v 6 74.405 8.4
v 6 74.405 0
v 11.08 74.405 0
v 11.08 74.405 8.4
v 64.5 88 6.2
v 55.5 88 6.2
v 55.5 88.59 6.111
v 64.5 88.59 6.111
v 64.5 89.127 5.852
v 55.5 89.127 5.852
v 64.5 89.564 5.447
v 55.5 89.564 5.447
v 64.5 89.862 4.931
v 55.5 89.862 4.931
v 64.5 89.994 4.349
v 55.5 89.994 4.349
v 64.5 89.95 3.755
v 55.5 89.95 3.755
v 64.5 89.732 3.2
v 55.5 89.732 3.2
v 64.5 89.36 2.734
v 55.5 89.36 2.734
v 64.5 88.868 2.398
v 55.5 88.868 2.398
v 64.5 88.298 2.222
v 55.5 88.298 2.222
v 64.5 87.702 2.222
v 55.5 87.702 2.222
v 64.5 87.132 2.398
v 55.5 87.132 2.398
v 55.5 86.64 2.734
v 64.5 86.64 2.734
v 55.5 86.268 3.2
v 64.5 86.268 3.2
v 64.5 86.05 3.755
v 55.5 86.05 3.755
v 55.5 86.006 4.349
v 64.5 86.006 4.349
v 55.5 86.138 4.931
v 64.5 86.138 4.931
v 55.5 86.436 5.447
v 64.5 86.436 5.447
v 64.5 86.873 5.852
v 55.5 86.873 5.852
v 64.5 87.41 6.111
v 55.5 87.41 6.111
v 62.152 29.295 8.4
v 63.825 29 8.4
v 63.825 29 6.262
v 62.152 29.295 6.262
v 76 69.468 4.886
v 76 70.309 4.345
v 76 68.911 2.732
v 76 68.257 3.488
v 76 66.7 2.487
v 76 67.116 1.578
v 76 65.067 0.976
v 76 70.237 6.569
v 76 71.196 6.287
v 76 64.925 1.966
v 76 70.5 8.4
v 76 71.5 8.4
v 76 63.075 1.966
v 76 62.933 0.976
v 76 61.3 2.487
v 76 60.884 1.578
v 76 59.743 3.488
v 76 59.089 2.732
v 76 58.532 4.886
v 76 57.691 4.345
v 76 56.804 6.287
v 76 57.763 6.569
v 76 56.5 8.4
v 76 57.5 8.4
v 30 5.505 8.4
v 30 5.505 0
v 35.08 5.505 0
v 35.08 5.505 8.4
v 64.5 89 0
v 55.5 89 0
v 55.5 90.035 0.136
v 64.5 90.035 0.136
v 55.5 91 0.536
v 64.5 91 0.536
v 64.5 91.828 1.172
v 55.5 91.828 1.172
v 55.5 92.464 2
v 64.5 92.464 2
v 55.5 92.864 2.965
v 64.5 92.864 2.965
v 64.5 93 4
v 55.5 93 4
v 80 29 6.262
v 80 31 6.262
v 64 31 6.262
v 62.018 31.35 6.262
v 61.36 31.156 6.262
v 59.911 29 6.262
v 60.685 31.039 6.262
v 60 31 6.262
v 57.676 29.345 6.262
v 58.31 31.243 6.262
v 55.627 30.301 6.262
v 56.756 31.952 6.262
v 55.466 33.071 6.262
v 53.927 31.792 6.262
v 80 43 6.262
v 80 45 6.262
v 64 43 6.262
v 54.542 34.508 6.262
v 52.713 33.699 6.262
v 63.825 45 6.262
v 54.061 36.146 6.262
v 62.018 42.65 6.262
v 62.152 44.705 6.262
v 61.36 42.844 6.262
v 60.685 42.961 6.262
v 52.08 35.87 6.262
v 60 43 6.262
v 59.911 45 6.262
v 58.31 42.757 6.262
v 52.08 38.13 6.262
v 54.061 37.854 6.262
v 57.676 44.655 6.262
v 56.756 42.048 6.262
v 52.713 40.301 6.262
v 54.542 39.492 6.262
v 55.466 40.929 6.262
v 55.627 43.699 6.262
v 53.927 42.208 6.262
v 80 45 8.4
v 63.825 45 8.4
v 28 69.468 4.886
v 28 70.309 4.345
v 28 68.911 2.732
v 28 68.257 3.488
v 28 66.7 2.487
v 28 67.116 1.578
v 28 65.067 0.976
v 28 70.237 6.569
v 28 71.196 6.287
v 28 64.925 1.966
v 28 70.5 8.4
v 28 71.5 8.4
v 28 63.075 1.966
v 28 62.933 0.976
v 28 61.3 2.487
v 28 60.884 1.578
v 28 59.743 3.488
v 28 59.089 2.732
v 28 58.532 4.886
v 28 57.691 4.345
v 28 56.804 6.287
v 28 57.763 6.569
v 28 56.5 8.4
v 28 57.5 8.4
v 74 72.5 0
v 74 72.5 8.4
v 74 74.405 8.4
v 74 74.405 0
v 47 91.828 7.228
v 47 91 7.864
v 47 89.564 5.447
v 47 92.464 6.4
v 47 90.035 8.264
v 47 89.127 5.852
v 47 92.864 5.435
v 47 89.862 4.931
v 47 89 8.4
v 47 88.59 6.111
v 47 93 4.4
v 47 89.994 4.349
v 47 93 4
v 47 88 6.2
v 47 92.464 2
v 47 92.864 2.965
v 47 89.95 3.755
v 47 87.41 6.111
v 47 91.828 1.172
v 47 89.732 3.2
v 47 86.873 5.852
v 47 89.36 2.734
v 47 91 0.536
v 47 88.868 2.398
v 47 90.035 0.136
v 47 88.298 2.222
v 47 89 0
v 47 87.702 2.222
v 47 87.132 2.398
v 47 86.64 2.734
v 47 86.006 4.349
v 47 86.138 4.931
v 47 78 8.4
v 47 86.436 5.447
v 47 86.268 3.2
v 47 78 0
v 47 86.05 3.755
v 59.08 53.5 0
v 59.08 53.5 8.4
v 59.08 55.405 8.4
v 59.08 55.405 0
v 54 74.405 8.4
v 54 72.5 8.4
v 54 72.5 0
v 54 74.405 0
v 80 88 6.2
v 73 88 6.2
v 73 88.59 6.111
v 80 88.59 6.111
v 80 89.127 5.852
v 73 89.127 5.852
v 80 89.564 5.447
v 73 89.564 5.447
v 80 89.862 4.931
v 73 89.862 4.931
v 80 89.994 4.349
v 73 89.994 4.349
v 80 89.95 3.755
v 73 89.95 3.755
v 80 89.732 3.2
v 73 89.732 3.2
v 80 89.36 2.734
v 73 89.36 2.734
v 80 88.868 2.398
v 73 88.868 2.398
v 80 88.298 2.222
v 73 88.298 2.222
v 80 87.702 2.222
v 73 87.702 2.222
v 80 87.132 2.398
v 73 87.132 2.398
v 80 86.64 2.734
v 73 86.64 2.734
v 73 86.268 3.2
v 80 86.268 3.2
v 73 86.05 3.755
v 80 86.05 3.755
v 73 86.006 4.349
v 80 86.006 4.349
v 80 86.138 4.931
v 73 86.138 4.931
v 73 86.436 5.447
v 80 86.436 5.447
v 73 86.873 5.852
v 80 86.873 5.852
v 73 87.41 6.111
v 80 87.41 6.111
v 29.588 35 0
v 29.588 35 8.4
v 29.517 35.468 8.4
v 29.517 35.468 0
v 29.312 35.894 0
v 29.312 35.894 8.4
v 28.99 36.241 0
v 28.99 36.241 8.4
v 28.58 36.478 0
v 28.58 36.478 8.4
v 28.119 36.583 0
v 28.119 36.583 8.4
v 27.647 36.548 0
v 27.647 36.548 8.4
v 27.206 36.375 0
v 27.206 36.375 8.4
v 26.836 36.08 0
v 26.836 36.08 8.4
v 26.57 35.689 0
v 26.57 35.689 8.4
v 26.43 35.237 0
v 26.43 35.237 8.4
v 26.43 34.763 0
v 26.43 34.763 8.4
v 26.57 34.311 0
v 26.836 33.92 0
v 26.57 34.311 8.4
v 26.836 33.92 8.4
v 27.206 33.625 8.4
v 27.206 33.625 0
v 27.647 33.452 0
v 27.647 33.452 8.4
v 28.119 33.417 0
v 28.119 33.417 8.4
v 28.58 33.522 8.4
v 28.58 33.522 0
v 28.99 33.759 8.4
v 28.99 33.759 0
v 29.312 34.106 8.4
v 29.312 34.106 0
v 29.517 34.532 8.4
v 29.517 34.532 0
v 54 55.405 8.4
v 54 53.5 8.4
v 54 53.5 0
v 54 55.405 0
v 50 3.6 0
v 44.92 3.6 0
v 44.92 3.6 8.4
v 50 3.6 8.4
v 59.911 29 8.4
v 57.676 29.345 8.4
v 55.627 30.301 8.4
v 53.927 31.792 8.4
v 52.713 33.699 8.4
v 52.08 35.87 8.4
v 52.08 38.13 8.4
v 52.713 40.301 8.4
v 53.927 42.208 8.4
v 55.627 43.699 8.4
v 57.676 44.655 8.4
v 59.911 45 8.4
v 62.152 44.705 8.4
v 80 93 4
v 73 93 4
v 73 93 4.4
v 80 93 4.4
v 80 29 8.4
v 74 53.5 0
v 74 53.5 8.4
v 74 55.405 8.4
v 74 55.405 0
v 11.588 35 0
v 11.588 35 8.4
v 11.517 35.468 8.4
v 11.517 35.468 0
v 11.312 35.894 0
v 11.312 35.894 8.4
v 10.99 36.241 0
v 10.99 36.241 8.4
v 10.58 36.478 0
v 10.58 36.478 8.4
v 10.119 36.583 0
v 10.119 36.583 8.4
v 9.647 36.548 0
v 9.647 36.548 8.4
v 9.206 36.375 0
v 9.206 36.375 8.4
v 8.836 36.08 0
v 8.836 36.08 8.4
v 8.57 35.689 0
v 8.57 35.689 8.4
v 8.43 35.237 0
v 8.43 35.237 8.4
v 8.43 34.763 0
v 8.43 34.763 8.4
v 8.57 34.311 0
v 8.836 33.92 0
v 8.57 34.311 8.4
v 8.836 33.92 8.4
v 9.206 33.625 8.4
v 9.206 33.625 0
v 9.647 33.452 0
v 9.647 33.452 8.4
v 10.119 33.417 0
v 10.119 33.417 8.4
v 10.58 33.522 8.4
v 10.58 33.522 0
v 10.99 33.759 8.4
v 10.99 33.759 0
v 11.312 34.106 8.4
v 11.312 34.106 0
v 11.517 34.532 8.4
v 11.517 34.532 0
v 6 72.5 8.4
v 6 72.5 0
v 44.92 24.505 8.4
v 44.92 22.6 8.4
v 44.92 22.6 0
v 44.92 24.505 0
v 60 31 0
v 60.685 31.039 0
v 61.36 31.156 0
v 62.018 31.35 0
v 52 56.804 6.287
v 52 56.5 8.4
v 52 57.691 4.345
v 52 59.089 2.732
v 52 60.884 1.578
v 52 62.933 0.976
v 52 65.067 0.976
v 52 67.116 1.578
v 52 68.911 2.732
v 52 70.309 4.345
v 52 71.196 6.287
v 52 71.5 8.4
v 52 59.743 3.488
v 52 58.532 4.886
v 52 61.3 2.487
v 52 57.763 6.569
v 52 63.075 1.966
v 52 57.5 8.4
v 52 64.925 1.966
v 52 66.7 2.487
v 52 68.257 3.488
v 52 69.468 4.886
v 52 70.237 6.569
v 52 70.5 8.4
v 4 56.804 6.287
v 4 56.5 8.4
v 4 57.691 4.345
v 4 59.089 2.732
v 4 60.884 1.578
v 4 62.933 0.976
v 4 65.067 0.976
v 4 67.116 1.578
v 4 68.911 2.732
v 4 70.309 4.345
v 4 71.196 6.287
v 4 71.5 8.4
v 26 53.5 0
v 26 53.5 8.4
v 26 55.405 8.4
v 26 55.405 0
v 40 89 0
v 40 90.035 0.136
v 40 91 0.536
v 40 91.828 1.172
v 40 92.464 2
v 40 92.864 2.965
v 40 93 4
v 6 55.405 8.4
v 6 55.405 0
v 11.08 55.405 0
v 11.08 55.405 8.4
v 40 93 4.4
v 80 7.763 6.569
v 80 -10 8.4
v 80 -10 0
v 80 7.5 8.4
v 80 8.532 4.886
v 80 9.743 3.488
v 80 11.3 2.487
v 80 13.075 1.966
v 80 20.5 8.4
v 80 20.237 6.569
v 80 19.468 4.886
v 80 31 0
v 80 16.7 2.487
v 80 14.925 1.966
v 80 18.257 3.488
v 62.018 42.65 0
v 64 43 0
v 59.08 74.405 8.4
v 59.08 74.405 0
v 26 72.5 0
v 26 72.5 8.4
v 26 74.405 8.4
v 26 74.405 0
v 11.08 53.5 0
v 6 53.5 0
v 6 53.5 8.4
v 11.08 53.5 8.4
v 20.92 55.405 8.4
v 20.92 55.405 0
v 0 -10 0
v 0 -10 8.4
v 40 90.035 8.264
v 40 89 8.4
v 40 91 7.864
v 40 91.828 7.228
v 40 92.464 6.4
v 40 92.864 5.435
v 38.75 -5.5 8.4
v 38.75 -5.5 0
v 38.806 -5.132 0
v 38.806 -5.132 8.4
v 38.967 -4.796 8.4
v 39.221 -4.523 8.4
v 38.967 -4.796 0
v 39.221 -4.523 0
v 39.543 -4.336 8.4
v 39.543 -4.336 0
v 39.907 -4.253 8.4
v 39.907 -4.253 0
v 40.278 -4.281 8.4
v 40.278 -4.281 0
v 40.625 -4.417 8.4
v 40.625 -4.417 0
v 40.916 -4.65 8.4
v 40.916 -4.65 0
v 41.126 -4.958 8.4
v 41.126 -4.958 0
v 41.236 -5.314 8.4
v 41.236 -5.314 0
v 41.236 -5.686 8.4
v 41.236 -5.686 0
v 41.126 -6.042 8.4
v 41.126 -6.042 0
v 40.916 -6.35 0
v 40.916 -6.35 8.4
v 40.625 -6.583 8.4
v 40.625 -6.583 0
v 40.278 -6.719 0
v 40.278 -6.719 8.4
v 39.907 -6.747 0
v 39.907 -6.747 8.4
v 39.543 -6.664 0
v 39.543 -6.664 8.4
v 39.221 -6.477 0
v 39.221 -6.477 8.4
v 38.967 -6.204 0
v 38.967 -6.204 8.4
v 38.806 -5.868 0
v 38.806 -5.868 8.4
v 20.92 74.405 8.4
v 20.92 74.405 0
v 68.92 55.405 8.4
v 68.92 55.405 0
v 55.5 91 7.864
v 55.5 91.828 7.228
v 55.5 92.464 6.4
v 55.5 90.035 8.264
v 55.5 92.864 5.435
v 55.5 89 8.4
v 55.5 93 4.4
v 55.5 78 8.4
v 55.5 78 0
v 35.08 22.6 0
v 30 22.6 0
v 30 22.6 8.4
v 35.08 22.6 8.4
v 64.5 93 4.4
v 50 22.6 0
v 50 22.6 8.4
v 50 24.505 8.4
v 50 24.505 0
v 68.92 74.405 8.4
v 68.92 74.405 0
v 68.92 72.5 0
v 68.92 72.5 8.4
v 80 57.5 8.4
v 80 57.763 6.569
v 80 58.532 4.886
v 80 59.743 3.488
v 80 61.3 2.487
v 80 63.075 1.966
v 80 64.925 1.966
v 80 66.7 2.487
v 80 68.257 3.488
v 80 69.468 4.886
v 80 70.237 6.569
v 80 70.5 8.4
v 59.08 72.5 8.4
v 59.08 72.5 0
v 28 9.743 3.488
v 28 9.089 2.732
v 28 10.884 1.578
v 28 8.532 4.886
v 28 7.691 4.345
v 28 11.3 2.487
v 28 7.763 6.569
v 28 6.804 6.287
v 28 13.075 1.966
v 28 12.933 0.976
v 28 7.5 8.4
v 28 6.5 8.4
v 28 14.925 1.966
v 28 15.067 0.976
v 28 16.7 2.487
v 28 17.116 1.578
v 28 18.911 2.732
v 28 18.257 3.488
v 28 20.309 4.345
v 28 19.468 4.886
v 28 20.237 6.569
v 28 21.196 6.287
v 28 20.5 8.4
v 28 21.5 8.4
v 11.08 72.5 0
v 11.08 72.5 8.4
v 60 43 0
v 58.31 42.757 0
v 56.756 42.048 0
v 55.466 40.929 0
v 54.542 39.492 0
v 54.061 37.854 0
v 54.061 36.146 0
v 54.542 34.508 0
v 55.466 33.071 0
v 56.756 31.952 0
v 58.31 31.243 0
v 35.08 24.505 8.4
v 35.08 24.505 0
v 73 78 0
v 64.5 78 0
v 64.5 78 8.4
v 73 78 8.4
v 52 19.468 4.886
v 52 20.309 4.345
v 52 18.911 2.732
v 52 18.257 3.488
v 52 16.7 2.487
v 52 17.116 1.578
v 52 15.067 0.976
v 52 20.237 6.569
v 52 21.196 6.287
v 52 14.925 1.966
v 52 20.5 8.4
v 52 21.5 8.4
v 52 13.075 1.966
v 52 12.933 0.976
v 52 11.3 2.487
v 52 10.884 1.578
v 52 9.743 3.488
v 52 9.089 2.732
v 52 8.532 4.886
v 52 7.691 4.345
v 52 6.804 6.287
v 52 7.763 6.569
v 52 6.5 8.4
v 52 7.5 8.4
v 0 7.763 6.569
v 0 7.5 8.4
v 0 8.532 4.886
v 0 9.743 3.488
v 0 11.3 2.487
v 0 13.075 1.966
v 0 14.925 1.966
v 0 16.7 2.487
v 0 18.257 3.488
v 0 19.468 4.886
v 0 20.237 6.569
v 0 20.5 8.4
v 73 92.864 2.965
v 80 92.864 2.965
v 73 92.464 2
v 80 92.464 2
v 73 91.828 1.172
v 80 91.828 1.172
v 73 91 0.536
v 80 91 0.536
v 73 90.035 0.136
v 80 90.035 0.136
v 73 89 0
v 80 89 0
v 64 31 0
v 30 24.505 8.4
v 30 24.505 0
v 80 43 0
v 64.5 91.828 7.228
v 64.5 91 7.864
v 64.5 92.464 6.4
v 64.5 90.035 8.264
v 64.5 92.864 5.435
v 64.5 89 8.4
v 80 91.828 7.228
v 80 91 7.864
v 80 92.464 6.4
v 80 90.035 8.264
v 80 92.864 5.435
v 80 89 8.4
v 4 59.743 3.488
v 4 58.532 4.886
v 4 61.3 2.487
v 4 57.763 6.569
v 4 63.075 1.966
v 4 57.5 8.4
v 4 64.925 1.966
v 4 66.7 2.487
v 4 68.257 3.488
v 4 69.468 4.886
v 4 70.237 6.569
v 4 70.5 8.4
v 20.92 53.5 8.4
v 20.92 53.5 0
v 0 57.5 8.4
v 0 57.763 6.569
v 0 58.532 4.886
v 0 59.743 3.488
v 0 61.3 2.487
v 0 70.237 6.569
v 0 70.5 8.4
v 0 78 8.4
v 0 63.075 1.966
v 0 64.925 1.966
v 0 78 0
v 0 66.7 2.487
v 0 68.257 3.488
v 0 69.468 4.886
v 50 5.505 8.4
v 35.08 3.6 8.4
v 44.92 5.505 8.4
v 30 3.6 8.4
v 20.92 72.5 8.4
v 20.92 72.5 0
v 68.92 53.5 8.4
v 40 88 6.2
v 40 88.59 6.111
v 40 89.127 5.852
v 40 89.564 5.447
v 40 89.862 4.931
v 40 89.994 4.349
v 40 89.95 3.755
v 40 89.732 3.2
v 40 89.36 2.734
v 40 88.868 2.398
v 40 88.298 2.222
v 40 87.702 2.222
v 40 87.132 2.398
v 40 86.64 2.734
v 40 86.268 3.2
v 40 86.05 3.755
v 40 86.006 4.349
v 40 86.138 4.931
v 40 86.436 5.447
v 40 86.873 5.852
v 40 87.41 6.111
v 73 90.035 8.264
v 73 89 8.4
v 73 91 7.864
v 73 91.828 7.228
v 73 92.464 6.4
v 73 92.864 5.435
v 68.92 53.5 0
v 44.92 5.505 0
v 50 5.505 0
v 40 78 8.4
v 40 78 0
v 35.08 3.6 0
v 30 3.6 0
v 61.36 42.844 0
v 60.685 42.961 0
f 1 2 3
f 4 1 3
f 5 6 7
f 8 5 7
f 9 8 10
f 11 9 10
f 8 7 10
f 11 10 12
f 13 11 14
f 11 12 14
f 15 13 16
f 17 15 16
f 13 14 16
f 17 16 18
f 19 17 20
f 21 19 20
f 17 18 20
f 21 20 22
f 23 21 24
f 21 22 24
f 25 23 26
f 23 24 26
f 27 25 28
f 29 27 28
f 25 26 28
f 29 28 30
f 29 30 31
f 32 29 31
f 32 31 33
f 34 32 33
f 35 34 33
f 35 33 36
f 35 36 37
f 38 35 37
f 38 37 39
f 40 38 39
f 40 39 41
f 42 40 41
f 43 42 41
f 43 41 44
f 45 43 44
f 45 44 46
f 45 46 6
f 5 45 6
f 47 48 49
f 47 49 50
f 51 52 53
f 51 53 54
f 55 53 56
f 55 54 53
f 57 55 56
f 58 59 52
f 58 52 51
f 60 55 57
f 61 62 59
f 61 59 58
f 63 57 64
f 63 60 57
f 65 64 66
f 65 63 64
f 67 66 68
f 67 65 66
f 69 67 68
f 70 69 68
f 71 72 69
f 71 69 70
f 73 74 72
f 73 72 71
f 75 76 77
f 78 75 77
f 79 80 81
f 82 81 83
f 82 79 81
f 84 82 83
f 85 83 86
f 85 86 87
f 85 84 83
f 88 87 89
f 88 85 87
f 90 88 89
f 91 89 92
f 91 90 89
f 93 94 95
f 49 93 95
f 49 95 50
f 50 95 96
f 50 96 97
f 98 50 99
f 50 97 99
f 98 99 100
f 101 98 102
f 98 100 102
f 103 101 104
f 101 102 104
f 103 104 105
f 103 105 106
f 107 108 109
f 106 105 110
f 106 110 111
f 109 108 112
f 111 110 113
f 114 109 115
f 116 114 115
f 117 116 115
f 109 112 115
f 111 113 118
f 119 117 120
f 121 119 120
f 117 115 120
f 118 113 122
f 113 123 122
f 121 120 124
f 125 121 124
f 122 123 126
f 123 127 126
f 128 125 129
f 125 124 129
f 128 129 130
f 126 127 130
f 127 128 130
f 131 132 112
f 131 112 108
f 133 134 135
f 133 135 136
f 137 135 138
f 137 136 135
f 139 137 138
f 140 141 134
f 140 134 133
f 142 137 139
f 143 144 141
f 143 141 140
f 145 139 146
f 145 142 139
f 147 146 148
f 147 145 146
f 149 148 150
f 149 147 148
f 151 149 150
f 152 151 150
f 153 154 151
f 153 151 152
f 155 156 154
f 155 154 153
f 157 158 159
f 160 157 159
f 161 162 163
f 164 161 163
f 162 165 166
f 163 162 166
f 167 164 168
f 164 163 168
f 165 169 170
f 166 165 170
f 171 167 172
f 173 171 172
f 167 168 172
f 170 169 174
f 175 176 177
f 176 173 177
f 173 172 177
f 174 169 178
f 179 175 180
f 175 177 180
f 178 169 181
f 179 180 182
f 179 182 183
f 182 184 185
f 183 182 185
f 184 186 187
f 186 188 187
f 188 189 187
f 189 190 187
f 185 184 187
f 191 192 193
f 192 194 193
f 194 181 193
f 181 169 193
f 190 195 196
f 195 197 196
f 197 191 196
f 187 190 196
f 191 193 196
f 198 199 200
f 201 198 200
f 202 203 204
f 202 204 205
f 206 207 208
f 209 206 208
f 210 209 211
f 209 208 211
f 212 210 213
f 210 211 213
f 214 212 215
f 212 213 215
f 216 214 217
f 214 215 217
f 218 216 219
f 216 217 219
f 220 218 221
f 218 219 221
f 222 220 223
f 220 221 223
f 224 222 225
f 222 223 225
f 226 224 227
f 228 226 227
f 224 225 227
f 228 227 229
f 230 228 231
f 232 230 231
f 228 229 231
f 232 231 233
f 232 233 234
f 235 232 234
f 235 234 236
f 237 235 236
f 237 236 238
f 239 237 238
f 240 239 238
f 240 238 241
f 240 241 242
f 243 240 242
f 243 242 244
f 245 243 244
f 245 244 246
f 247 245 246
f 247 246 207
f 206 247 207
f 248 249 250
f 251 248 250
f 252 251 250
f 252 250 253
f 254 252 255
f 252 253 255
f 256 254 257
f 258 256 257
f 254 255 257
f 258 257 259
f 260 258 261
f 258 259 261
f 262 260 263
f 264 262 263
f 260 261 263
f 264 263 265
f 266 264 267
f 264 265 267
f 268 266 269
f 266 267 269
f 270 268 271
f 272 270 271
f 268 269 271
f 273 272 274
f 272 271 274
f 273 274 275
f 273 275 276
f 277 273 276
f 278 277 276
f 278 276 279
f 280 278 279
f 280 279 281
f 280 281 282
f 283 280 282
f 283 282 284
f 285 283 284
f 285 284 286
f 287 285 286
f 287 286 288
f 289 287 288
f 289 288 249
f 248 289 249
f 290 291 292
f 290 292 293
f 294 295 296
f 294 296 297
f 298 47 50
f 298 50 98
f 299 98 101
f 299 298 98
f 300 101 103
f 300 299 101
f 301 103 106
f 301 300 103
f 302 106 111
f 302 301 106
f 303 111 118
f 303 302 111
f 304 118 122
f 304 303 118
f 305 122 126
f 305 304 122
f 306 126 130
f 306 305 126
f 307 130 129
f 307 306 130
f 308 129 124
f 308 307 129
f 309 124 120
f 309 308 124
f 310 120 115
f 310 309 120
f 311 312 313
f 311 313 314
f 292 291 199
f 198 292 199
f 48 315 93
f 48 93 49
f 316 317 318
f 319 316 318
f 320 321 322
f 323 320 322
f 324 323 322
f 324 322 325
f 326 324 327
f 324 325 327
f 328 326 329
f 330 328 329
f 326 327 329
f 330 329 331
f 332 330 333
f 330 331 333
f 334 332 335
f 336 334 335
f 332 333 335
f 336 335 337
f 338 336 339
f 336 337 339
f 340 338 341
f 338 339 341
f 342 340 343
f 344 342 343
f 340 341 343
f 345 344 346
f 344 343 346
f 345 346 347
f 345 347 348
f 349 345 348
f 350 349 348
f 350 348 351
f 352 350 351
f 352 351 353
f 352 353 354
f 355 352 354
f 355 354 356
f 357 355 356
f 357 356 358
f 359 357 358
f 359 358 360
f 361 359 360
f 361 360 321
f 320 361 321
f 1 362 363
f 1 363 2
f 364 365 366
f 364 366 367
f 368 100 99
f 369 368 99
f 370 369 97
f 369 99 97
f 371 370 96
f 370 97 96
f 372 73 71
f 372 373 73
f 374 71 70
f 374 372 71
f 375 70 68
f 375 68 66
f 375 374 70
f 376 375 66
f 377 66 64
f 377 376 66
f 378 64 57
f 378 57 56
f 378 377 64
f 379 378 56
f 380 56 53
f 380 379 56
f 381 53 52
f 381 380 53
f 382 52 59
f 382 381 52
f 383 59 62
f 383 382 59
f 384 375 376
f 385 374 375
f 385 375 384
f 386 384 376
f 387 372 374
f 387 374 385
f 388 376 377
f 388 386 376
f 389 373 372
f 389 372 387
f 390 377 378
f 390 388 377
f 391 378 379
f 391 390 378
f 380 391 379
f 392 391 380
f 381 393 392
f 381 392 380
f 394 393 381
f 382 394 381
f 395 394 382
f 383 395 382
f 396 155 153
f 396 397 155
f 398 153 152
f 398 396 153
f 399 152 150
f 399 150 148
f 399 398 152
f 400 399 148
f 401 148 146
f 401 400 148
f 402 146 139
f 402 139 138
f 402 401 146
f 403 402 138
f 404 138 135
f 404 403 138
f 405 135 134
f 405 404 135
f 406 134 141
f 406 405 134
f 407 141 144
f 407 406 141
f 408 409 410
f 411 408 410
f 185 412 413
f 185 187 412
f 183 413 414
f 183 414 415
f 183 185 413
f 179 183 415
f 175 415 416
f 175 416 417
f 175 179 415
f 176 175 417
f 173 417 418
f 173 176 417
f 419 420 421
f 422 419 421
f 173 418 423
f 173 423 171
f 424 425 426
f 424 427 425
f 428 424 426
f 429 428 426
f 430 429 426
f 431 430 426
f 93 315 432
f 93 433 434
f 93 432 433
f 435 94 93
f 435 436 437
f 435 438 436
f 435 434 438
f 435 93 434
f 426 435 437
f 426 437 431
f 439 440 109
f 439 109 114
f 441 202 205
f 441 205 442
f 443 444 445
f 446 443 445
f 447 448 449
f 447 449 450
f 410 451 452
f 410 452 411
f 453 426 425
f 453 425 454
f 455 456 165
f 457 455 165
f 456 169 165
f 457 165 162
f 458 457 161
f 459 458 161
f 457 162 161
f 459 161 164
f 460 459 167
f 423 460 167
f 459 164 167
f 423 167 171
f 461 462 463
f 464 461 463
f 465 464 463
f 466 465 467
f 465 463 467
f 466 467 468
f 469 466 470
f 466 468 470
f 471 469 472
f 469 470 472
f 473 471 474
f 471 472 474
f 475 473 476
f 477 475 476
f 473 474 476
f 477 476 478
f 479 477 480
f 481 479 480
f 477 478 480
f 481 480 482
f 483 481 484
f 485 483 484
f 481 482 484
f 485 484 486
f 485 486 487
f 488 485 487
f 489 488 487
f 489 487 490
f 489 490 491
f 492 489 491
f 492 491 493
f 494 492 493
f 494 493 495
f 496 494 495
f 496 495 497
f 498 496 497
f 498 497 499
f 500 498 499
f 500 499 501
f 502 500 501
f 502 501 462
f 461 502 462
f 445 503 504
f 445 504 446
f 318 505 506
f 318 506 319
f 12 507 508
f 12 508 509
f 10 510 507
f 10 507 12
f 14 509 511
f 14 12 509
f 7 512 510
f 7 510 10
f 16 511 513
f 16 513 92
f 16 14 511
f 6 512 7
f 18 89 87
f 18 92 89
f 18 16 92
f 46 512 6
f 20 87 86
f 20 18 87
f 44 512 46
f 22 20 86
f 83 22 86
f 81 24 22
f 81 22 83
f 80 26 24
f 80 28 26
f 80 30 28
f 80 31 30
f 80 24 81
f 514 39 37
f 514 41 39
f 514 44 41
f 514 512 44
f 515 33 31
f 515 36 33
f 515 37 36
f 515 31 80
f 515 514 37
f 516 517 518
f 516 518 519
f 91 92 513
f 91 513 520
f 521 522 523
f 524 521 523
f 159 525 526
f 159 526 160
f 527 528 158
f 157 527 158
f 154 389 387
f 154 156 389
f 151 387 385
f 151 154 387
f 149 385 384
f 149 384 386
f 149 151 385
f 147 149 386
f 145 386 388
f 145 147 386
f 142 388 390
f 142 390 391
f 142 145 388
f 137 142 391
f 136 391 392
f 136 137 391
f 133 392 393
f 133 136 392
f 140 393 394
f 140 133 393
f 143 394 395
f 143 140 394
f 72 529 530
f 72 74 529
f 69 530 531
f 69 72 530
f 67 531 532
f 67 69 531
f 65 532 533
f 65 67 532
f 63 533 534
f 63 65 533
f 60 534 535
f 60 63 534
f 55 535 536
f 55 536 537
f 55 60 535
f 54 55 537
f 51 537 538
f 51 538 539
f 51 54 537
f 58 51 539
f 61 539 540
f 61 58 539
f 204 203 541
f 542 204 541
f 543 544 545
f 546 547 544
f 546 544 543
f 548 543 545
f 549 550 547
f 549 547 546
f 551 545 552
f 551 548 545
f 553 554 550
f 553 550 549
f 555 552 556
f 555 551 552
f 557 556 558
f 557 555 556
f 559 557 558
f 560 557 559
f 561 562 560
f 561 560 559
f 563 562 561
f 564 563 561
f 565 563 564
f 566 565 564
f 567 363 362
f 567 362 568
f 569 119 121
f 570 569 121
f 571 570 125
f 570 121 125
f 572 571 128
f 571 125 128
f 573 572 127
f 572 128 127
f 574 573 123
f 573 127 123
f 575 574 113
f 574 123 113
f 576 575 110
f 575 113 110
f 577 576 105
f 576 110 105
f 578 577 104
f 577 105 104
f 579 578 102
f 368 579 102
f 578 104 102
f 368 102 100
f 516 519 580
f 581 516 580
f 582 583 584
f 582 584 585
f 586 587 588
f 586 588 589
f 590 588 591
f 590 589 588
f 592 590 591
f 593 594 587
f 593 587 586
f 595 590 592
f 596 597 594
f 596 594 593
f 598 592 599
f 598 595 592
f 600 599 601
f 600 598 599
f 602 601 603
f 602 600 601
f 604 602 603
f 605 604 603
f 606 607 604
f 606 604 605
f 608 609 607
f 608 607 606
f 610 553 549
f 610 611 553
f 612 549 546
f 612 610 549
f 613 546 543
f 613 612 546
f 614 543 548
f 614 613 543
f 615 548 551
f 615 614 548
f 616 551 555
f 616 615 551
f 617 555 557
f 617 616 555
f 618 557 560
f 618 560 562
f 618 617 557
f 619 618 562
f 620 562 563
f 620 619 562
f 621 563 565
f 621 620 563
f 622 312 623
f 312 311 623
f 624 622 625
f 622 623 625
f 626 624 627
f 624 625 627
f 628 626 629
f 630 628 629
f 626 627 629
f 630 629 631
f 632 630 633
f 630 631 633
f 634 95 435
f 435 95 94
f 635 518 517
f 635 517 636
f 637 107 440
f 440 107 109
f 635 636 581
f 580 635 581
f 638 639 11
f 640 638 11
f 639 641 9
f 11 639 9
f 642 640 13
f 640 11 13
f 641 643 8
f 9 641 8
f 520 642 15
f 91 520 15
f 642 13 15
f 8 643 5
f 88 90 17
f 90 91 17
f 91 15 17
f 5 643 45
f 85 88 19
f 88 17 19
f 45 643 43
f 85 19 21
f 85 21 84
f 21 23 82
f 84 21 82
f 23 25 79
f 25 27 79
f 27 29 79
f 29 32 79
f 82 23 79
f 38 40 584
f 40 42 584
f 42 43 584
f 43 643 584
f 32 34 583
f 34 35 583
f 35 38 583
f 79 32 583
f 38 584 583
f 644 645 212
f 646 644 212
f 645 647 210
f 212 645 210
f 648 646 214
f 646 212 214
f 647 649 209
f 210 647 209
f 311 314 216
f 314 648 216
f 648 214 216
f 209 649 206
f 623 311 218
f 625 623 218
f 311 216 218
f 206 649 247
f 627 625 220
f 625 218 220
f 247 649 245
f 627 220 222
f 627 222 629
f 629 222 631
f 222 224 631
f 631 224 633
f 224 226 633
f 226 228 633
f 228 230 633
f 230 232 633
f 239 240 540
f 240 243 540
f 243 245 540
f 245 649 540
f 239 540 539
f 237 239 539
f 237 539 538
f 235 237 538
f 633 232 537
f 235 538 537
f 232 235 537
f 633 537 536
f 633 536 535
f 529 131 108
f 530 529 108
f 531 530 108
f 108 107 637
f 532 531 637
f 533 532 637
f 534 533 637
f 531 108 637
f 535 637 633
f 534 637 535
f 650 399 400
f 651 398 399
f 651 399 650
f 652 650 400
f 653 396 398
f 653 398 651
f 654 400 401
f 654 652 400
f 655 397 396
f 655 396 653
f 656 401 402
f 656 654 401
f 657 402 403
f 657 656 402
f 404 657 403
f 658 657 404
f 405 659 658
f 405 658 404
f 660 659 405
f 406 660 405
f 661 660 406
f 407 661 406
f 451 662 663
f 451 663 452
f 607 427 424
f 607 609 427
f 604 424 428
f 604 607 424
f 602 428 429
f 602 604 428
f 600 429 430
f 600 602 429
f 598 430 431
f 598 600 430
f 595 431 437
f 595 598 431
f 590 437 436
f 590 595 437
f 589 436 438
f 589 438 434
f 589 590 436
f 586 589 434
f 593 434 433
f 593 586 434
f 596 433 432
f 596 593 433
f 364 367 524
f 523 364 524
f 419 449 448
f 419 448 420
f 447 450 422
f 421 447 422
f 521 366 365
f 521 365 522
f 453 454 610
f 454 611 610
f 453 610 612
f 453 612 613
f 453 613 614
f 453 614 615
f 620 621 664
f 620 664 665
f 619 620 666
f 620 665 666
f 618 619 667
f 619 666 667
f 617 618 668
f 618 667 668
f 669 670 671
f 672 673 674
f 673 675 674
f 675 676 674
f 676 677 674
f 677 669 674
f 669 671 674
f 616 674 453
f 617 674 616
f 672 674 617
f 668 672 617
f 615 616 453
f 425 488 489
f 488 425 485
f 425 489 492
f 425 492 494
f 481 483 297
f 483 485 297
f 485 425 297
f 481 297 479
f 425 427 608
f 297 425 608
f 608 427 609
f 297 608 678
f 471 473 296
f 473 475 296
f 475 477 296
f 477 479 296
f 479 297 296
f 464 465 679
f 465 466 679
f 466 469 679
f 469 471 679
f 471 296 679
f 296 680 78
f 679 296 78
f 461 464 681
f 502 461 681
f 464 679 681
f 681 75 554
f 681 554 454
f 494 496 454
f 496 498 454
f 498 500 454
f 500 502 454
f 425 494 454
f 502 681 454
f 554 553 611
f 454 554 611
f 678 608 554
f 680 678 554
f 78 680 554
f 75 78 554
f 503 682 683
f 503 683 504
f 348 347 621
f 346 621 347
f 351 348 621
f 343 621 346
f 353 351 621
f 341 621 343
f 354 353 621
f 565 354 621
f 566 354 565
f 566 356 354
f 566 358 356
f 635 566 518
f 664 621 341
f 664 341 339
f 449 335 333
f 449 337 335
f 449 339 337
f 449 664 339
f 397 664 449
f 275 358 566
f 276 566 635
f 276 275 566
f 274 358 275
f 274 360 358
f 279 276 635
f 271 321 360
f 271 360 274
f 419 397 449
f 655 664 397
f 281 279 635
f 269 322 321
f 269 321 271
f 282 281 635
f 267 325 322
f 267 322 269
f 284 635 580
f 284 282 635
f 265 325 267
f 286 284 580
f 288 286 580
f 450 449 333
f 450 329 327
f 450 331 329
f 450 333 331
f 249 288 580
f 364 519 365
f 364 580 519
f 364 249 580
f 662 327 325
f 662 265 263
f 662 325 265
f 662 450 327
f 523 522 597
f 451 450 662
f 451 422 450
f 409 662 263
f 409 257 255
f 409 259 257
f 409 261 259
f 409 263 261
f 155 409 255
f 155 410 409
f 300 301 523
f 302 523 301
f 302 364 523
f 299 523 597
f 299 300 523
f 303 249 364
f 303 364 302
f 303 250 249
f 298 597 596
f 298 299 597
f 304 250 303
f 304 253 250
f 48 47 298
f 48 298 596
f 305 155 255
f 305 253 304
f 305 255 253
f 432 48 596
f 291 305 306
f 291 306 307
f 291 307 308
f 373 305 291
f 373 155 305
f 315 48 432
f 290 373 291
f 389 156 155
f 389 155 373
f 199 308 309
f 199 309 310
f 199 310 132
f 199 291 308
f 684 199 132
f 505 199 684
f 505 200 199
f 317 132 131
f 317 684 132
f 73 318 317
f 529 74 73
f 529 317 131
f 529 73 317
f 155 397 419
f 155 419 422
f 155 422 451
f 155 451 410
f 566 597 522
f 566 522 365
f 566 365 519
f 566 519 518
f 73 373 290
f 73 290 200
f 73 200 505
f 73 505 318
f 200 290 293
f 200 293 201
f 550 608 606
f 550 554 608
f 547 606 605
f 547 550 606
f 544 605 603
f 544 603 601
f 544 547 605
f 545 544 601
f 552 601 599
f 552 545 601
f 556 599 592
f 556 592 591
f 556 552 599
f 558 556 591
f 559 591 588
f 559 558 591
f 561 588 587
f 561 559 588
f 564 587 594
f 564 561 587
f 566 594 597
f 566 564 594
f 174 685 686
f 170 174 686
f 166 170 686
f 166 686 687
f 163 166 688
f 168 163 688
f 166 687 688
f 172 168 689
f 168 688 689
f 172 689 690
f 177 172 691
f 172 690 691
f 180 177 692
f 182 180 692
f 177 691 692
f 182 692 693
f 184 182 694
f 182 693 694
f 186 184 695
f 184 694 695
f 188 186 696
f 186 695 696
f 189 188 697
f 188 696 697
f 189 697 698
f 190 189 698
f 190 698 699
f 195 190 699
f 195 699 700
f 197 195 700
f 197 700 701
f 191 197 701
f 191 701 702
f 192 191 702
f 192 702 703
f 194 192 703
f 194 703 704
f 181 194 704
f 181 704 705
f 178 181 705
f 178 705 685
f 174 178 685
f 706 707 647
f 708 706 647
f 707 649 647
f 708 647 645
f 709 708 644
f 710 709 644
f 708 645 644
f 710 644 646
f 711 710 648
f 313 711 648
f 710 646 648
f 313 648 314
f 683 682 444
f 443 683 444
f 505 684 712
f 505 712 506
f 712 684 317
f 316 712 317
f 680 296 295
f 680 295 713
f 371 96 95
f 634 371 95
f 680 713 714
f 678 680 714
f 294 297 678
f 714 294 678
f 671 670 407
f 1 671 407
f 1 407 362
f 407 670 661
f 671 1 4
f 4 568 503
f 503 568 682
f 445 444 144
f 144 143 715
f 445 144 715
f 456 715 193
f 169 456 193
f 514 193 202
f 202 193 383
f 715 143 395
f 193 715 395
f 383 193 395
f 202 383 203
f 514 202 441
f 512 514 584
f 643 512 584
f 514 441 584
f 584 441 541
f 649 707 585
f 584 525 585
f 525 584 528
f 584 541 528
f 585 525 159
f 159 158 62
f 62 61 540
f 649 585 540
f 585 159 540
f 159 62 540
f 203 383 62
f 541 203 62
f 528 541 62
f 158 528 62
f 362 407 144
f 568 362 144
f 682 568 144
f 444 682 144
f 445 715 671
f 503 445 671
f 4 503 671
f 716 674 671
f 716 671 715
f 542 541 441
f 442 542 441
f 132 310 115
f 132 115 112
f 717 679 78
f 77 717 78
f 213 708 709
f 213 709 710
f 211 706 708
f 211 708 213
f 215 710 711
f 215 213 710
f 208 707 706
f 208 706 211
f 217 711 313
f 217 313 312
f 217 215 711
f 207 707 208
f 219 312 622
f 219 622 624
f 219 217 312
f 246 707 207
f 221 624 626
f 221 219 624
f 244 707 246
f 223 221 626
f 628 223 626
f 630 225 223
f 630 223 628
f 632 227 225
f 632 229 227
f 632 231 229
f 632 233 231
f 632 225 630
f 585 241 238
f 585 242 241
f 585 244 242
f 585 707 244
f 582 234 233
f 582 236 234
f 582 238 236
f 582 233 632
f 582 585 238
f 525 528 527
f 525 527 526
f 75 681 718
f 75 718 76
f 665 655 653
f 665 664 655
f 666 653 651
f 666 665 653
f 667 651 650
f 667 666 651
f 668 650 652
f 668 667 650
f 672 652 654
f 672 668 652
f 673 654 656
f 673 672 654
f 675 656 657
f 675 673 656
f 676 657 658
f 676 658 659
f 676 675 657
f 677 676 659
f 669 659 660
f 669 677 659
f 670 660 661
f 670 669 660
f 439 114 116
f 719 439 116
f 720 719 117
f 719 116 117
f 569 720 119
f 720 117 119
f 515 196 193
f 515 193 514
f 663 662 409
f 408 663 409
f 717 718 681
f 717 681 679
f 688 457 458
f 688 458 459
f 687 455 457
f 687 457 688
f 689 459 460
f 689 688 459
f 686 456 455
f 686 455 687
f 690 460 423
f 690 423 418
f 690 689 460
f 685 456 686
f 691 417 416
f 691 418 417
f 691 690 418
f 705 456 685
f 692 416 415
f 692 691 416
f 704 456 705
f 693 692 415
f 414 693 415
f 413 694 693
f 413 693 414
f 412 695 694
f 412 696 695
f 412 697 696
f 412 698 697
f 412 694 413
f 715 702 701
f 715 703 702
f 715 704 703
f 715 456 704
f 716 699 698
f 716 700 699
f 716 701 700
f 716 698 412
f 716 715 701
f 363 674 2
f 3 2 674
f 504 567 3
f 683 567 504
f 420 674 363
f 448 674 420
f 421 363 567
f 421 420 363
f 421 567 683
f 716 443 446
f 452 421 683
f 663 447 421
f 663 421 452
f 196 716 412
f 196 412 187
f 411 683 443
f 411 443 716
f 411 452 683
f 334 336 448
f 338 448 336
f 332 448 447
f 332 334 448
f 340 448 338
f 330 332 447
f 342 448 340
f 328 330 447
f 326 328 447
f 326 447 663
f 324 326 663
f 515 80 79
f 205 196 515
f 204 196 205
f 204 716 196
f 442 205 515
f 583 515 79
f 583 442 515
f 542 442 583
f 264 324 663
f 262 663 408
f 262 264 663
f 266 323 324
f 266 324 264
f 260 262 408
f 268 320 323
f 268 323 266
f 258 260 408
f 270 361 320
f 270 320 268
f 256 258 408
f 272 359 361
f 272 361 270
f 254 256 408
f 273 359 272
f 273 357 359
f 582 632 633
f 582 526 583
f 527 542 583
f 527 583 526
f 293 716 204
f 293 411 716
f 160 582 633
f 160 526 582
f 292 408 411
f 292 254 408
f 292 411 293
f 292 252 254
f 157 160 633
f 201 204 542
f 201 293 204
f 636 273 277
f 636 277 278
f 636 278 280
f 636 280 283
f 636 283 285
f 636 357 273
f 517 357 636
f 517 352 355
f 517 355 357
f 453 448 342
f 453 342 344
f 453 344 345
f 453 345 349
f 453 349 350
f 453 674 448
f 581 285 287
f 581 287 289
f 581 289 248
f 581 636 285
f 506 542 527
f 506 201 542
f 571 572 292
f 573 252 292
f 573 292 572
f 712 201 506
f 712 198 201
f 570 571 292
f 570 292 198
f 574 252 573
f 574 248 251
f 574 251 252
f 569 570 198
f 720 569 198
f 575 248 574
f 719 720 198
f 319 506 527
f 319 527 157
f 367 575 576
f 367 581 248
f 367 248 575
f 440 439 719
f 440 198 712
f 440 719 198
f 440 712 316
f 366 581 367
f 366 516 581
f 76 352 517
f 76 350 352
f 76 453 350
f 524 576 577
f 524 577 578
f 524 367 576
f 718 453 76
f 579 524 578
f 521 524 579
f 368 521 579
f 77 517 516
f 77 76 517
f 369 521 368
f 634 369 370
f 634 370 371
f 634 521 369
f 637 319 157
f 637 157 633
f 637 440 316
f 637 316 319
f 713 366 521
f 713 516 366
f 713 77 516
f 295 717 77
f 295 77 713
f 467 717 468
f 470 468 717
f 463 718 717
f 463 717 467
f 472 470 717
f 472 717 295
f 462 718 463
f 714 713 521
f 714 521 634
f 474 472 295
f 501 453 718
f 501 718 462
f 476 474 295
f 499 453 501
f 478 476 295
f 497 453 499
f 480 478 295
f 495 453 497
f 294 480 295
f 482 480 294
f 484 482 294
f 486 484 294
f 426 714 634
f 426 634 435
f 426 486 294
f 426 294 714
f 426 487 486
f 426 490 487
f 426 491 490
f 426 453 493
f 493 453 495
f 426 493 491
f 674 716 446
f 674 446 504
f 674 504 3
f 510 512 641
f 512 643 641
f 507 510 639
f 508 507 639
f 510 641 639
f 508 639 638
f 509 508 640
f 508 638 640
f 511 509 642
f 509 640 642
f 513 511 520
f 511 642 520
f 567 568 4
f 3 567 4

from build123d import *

# Parameters (mm, degrees)
SKETCH1_W                      = 80
SKETCH1_H                      = 78
BOSS_EXTRUDE1_DEPTH            = 8.4
SKETCH4_W                      = 5.08
SKETCH4_H                      = 1.905
CUT_EXTRUDE1_DEPTH             = 9.4
LPATTERN1_COUNT                = 2
LPATTERN1_PITCH                = 19
LPATTERN1_COUNT_DIR2           = 2
LPATTERN1_PITCH_DIR2           = 48
SKETCH5_W                      = 5.08
SKETCH5_H                      = 1.905
CUT_EXTRUDE2_DEPTH             = 8.4
LPATTERN2_COUNT                = 2
LPATTERN2_PITCH                = 19
CUT_EXTRUDE3_DEPTH             = 9.4
CUT_EXTRUDE4_DEPTH             = 2.138
SKETCH9_R                      = 1.5875
CUT_EXTRUDE5_DEPTH             = 9.4
SKETCH11_W                     = 80
SKETCH11_H                     = 8.4
BOSS_EXTRUDE3_DEPTH            = 10
F_2_5_2_5_DIAMETER_HOLE1_D     = 2.5
F_2_5_2_5_DIAMETER_HOLE1_DEPTH = 10
SKETCH14_W                     = 9
SKETCH14_H                     = 8.4
SKETCH14_W_2                   = 7
BOSS_EXTRUDE4_DEPTH            = 15
SKETCH16_R                     = 2
CUT_EXTRUDE6_DEPTH             = 45.4
FILLET1_R                      = 4


with BuildPart() as part:
    # Sketch1 → Boss-Extrude1 (new body)
    with BuildSketch(Plane.XY):
        with Locations((40, 39)):
            Rectangle(SKETCH1_W, SKETCH1_H)
    extrude(amount=BOSS_EXTRUDE1_DEPTH)

    # Sketch2 → Cut-Revolve1 (revolve, cut)
    with BuildSketch(Plane.XY.offset(8.4)):
        Polygon((0, 70.5), (0, 64), (9.541087991, 64), (23.495378694, 64), (54.462434776, 64), (68.225570813, 64), (80, 64), (80, 70.5), (76, 70.5), (76, 71.5), (52, 71.5), (52, 70.5), (28, 70.5), (28, 71.5), (4, 71.5), (4, 70.5), align=None)
    revolve(axis=Axis((0, 64, 8.4), (1, 0, 0)), mode=Mode.SUBTRACT)

    # Sketch3 → Cut-Revolve2 (revolve, cut)
    with BuildSketch(Plane.XY.offset(8.4)):
        Polygon((0, 20.5), (0, 14), (25.709253363, 14), (47.957380272, 14), (80, 14), (80, 20.5), (52, 20.5), (52, 21.5), (28, 21.5), (28, 20.5), align=None)
    revolve(axis=Axis((0, 14, 8.4), (1, 0, 0)), mode=Mode.SUBTRACT)

    # Sketch4 → Cut-Extrude1 (cut, through all)
    with BuildSketch(Plane.XY.offset(8.4)):
        with Locations((8.54, 73.4525)):
            Rectangle(SKETCH4_W, SKETCH4_H)
        with Locations((23.46, 73.4525)):
            Rectangle(SKETCH4_W, SKETCH4_H)
    cut_extrude1 = extrude(amount=-CUT_EXTRUDE1_DEPTH, mode=Mode.SUBTRACT)

    # LPattern1: Cut-Extrude1 2 × 2
    with Locations(*[(j * LPATTERN1_PITCH_DIR2, -i * LPATTERN1_PITCH, 0) for i in range(LPATTERN1_COUNT) for j in range(LPATTERN1_COUNT_DIR2) if (i, j) != (0, 0)]):
        add(cut_extrude1, mode=Mode.SUBTRACT)

    # Sketch5 → Cut-Extrude2 (cut)
    with BuildSketch(Plane.XY.offset(8.4)):
        with Locations((32.54, 23.5525)):
            Rectangle(SKETCH5_W, SKETCH5_H)
        with Locations((47.46, 23.5525)):
            Rectangle(SKETCH5_W, SKETCH5_H)
    cut_extrude2 = extrude(amount=-CUT_EXTRUDE2_DEPTH, mode=Mode.SUBTRACT)

    # LPattern2: Cut-Extrude2 ×2
    with Locations(*[(0, -i * LPATTERN2_PITCH, 0) for i in range(1, LPATTERN2_COUNT)]):
        add(cut_extrude2, mode=Mode.SUBTRACT)

    # Sketch6 → Cut-Extrude3 (cut, through all)
    with BuildSketch(Plane.XY.offset(8.4)):
        with BuildLine():
            ThreePointArc((62.017883983, 42.650499467), (61.02396367, 42.911979229), (60, 43))
            ThreePointArc((60, 43), (54, 37), (60, 31))
            ThreePointArc((60, 31), (61.02396367, 31.088020771), (62.017883983, 31.349500533))
            Line((62.017883983, 31.349500533), (64, 31))
            Line((64, 31), (80, 31))
            Line((80, 31), (80, 43))
            Line((80, 43), (64, 43))
            Line((64, 43), (62.017883983, 42.650499467))
        make_face()
    extrude(amount=-CUT_EXTRUDE3_DEPTH, mode=Mode.SUBTRACT)

    # Sketch8 → Cut-Extrude4 (cut)
    with BuildSketch(Plane.XY.offset(8.4)):
        with BuildLine():
            Line((80, 45), (80, 29))
            Line((80, 29), (63.825022673, 29))
            Line((63.825022673, 29), (62.152264354, 29.294952424))
            ThreePointArc((62.152264354, 29.294952424), (52, 37), (62.152264354, 44.705047576))
            Line((62.152264354, 44.705047576), (63.825022673, 45))
            Line((63.825022673, 45), (80, 45))
        make_face()
    extrude(amount=-CUT_EXTRUDE4_DEPTH, mode=Mode.SUBTRACT)

    # Sketch9 → Cut-Extrude5 (cut, through all)
    with BuildSketch(Plane.XY.offset(8.4)):
        with Locations((10, 35)):
            Circle(SKETCH9_R)
        with Locations((28, 35)):
            Circle(SKETCH9_R)
    extrude(amount=-CUT_EXTRUDE5_DEPTH, mode=Mode.SUBTRACT)

    # Sketch11 → Boss-Extrude3 (add)
    with BuildSketch(Plane(origin=(0, 0, 0), x_dir=(-1, 0, 0), z_dir=(0, -1, 0))):
        with Locations((-40, -4.2)):
            Rectangle(SKETCH11_W, SKETCH11_H)
    extrude(amount=BOSS_EXTRUDE3_DEPTH)

    # Ø2.5 (2.5) Diameter Hole1
    with Locations(Plane.XY.offset(8.4)):
        with Locations((40, -5.5)):
            Hole(F_2_5_2_5_DIAMETER_HOLE1_D / 2, depth=F_2_5_2_5_DIAMETER_HOLE1_DEPTH)

    # Sketch14 → Boss-Extrude4 (add)
    with BuildSketch(Plane(origin=(0, 78, 0), x_dir=(1, 0, 0), z_dir=(0, 1, 0))):
        with Locations((60, -4.2)):
            Rectangle(SKETCH14_W, SKETCH14_H)
        with Locations((76.5, -4.2)):
            Rectangle(SKETCH14_W_2, SKETCH14_H)
        with Locations((43.5, -4.2)):
            Rectangle(SKETCH14_W_2, SKETCH14_H)
    extrude(amount=BOSS_EXTRUDE4_DEPTH)

    # Sketch16 → Cut-Extrude6 (cut)
    with BuildSketch(Plane.ZY.offset(-40)):
        with Locations((4.2, 88)):
            Circle(SKETCH16_R)
    extrude(amount=-CUT_EXTRUDE6_DEPTH, mode=Mode.SUBTRACT)

    # Fillet1
    fillet1_edges = [part.edges().sort_by_distance(p)[0] for p in [
        (76.5, 93, 8.4),
        (76.5, 93, 0),
        (60, 93, 8.4),
        (60, 93, 0),
        (43.5, 93, 8.4),
        (43.5, 93, 0),
    ]]
    fillet(fillet1_edges, radius=FILLET1_R)


solid = part.part
